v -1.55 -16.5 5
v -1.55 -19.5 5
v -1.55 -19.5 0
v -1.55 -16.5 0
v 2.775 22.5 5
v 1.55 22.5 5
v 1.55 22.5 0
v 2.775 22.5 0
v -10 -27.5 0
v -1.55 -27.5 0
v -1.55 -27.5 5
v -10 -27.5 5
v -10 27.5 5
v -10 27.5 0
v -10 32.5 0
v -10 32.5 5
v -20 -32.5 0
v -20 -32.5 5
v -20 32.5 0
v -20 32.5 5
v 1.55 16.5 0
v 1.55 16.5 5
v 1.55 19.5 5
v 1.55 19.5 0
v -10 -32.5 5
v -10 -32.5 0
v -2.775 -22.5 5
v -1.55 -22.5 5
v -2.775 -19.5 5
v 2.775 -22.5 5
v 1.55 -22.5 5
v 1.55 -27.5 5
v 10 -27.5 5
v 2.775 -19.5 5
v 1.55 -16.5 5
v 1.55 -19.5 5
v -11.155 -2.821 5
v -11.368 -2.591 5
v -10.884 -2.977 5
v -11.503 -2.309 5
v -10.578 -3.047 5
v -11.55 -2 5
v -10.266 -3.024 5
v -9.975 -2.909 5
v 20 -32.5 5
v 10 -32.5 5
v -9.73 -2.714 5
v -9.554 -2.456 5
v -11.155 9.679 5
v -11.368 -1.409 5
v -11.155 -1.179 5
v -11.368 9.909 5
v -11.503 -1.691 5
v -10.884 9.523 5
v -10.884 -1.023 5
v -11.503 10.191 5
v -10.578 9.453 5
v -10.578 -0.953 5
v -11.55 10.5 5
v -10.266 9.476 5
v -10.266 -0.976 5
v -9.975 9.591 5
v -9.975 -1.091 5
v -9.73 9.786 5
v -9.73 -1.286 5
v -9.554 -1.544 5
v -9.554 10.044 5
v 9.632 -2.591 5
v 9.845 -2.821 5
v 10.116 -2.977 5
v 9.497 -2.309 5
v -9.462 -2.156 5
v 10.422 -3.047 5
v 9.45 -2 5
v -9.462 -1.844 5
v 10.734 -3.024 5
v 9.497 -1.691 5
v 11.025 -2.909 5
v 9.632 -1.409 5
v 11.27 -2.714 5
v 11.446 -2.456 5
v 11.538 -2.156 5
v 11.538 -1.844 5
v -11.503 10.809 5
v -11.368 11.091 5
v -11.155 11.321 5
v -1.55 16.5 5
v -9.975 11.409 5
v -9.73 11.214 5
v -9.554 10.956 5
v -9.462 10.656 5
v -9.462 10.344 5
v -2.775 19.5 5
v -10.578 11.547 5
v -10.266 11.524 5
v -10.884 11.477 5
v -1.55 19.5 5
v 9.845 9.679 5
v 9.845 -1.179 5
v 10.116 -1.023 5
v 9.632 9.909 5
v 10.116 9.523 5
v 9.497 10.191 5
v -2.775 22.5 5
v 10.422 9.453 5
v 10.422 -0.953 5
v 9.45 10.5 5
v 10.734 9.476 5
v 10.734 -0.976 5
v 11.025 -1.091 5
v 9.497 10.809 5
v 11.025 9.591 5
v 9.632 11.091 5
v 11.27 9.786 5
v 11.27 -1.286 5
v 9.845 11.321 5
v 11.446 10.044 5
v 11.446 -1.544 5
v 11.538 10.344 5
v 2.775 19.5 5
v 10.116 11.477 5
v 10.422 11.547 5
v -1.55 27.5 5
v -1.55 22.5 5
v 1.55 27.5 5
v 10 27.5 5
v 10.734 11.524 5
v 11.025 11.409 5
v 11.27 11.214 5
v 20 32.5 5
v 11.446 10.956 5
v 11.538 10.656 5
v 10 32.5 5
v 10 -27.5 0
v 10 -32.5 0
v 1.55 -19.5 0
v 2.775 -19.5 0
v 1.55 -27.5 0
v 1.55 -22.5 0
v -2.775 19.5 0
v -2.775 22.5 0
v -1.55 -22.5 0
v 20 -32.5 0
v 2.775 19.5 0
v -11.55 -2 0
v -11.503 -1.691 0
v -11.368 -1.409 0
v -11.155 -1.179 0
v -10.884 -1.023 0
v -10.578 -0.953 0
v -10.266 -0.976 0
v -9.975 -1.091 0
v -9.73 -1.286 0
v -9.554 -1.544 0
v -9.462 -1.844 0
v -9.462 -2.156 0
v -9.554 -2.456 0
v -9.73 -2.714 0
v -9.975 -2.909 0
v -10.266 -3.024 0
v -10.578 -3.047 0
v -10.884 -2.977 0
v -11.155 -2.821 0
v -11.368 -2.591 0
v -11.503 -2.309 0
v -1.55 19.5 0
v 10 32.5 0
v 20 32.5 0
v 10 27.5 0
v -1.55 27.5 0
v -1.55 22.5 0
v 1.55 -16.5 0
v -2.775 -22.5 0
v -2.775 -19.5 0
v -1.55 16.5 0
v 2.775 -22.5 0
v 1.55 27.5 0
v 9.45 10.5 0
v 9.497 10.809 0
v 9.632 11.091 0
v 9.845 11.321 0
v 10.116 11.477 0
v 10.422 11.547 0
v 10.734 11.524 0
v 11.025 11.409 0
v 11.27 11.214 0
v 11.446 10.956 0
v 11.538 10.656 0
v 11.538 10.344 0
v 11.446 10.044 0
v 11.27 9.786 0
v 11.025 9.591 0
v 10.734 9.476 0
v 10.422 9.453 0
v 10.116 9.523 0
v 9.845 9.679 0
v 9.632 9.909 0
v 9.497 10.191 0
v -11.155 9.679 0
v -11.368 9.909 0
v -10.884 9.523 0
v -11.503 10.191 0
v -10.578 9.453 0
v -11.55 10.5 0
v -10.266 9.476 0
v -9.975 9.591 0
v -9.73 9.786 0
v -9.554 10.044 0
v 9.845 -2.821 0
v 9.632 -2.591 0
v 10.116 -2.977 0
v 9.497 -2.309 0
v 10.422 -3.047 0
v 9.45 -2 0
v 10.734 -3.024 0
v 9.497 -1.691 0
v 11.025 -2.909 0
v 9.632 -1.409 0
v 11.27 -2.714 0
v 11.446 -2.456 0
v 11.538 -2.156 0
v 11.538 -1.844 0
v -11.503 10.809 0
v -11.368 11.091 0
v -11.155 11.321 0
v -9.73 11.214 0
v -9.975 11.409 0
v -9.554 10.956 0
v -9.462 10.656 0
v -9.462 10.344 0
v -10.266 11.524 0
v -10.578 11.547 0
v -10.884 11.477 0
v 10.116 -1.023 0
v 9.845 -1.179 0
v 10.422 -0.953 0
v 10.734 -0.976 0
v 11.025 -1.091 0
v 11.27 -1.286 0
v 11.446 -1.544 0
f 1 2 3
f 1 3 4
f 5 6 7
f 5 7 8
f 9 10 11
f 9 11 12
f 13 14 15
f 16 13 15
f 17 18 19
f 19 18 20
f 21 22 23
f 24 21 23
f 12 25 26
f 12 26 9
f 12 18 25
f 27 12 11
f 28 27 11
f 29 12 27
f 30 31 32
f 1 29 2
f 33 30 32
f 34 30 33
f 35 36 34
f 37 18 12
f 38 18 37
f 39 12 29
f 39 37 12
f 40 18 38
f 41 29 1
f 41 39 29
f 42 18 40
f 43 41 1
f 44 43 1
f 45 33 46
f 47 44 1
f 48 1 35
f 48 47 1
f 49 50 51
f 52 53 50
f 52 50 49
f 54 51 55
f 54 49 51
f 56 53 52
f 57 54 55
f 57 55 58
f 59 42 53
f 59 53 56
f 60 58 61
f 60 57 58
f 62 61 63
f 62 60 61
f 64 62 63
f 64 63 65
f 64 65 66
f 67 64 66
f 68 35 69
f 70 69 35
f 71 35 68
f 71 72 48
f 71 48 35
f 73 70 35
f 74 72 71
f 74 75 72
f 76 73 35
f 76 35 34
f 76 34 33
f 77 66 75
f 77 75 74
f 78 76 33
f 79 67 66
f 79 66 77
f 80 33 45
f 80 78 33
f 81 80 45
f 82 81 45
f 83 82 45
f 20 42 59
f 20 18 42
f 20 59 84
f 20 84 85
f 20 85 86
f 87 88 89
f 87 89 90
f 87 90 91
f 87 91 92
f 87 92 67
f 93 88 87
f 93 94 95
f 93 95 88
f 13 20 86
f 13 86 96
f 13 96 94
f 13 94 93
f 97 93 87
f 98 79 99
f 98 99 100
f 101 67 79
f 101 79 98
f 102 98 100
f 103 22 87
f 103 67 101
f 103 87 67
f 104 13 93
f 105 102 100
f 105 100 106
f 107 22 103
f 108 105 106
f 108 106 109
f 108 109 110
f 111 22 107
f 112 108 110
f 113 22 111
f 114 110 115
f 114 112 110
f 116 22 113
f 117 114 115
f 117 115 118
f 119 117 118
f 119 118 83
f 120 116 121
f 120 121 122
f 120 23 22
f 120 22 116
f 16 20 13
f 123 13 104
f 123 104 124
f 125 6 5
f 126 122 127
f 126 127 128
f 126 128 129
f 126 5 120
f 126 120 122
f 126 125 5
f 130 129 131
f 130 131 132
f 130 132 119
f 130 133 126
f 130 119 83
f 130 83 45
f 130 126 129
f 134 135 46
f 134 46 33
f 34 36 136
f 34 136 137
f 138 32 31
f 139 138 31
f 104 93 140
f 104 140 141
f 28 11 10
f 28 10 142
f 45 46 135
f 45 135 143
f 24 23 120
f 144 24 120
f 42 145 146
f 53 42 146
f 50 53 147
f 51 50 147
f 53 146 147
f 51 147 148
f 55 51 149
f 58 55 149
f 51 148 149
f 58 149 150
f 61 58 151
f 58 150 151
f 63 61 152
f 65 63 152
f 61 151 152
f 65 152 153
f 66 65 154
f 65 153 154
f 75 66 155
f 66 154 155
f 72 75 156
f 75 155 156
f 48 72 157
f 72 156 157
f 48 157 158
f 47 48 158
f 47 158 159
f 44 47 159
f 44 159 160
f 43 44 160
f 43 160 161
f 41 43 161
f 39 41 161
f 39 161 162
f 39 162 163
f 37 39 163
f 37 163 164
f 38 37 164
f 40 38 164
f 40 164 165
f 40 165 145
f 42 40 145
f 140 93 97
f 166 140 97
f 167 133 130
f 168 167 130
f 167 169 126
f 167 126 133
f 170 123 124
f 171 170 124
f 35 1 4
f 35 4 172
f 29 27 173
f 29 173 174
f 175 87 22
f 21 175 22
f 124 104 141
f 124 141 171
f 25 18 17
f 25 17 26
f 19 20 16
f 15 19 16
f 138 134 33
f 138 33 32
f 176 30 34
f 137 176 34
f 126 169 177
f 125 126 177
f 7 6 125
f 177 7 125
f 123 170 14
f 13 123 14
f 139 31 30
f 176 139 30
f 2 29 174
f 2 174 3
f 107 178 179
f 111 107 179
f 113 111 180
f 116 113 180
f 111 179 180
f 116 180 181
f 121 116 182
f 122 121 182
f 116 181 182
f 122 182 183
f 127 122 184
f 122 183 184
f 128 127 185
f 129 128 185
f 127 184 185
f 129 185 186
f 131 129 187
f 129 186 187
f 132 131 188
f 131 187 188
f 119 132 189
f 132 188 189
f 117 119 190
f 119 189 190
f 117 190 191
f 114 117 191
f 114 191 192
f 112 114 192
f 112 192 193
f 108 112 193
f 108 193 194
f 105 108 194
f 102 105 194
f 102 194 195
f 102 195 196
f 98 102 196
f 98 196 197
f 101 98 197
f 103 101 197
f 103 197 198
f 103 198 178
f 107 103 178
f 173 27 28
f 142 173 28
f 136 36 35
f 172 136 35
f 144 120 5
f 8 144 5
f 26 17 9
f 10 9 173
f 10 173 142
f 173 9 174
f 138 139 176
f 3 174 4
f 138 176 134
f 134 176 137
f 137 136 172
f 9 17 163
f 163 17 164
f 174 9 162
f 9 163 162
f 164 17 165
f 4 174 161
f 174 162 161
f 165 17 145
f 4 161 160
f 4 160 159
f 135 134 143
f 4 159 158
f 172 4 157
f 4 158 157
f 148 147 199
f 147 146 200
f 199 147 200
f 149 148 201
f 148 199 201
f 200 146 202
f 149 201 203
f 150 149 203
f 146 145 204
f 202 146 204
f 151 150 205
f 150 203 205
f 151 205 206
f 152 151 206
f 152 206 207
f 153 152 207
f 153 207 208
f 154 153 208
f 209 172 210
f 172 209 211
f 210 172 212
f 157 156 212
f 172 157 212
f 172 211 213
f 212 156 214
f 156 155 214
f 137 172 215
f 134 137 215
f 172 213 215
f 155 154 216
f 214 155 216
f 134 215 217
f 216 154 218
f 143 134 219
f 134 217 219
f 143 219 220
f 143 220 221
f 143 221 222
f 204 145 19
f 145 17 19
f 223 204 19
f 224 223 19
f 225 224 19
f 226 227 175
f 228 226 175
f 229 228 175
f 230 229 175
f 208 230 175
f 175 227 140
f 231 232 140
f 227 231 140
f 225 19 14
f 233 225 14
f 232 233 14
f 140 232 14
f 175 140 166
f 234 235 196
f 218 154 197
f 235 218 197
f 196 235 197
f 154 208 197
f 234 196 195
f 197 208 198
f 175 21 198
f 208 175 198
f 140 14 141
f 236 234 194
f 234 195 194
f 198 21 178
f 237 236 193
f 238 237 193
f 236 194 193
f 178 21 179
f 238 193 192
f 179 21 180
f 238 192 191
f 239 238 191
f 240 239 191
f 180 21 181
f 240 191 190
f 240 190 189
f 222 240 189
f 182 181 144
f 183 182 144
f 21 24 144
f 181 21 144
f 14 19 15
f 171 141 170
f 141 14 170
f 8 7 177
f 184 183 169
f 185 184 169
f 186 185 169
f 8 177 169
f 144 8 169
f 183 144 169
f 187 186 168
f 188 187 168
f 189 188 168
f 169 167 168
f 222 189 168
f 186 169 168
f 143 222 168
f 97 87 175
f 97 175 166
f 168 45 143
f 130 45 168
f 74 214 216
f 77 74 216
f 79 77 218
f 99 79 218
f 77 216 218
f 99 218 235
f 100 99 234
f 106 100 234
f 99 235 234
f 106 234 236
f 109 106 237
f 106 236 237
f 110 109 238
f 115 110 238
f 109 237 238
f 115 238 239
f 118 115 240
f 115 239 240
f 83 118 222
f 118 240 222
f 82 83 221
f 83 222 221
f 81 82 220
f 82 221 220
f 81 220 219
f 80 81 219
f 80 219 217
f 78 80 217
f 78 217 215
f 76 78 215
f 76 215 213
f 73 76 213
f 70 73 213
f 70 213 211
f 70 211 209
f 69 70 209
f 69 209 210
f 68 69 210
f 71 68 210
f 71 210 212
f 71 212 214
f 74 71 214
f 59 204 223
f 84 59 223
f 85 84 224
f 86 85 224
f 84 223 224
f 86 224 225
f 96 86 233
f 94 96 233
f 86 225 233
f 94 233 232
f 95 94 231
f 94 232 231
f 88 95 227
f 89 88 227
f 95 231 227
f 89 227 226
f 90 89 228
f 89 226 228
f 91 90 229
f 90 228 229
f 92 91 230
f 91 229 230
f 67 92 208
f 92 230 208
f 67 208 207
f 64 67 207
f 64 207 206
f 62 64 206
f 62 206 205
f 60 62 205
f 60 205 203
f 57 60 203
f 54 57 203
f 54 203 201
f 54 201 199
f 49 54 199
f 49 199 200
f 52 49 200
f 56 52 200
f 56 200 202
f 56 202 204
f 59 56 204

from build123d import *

# Parameters (mm, degrees)
ESQUISSE1_W             = 40
ESQUISSE1_H             = 62
BOSS_EXTRU_1_DEPTH      = 5
ESQUISSE2_W             = 20
ESQUISSE2_H             = 3.5
ENL_V_MAT_EXTRU_1_DEPTH = 6
ESQUISSE3_W             = 20
ESQUISSE3_H             = 3.5
ENL_V_MAT_EXTRU_2_DEPTH = 6
ESQUISSE8_W             = 3.1
ESQUISSE8_H             = 3
ESQUISSE8_H_2           = 5
ESQUISSE8_W_2           = 1.225
ENL_V_MAT_EXTRU_3_DEPTH = 6
ESQUISSE9_W             = 10
ESQUISSE9_H             = 65
BOSS_EXTRU_2_DEPTH      = 5
ESQUISSE10_R            = 1.05
ENL_V_MAT_EXTRU_4_DEPTH = 6


with BuildPart() as part:
    # Esquisse1 → Boss.-Extru.1 (new body)
    with BuildSketch(Plane.XY.offset(5)):
        Rectangle(ESQUISSE1_W, ESQUISSE1_H)
    extrude(amount=-BOSS_EXTRU_1_DEPTH)

    # Esquisse2 → Enlèv. mat.-Extru.1 (cut, through all)
    with BuildSketch(Plane(origin=(0, 0, 0), x_dir=(-1, 0, 0), z_dir=(0, 0, -1))):
        with Locations((0, 29.25)):
            Rectangle(ESQUISSE2_W, ESQUISSE2_H)
    extrude(amount=-ENL_V_MAT_EXTRU_1_DEPTH, mode=Mode.SUBTRACT)

    # Esquisse3 → Enlèv. mat.-Extru.2 (cut, through all)
    with BuildSketch(Plane(origin=(0, 0, 0), x_dir=(-1, 0, 0), z_dir=(0, 0, -1))):
        with Locations((0, -29.25)):
            Rectangle(ESQUISSE3_W, ESQUISSE3_H)
    extrude(amount=-ENL_V_MAT_EXTRU_2_DEPTH, mode=Mode.SUBTRACT)

    # Esquisse8 → Enlèv. mat.-Extru.3 (cut, through all)
    with BuildSketch(Plane.XY.offset(5)):
        with Locations((0, 21)):
            Rectangle(ESQUISSE8_W, ESQUISSE8_H)
        with Locations((0, 25)):
            Rectangle(ESQUISSE8_W, ESQUISSE8_H_2)
        with Locations((-2.1625, 21)):
            Rectangle(ESQUISSE8_W_2, ESQUISSE8_H)
        with Locations((2.1625, 21)):
            Rectangle(ESQUISSE8_W_2, ESQUISSE8_H)
        with Locations((0, 18)):
            Rectangle(ESQUISSE8_W, ESQUISSE8_H)
        with Locations((0, -18)):
            Rectangle(ESQUISSE8_W, ESQUISSE8_H)
        with Locations((-2.1625, -21)):
            Rectangle(ESQUISSE8_W_2, ESQUISSE8_H)
        with Locations((0, -21)):
            Rectangle(ESQUISSE8_W, ESQUISSE8_H)
        with Locations((2.1625, -21)):
            Rectangle(ESQUISSE8_W_2, ESQUISSE8_H)
        with Locations((0, -25)):
            Rectangle(ESQUISSE8_W, ESQUISSE8_H_2)
    extrude(amount=-ENL_V_MAT_EXTRU_3_DEPTH, mode=Mode.SUBTRACT)

    # Esquisse9 → Boss.-Extru.2 (add)
    with BuildSketch(Plane.XY.offset(5)):
        with Locations((-15, 0)):
            Rectangle(ESQUISSE9_W, ESQUISSE9_H)
        with Locations((15, 0)):
            Rectangle(ESQUISSE9_W, ESQUISSE9_H)
    extrude(amount=-BOSS_EXTRU_2_DEPTH)

    # Esquisse10 → Enlèv. mat.-Extru.4 (cut, through all)
    with BuildSketch(Plane(origin=(0, 0, 0), x_dir=(-1, 0, 0), z_dir=(0, 0, -1))):
        with Locations((-10.5, 10.5)):
            Circle(ESQUISSE10_R)
        with Locations((10.5, 10.5)):
            Circle(ESQUISSE10_R)
        with Locations((10.5, -2)):
            Circle(ESQUISSE10_R)
        with Locations((-10.5, -2)):
            Circle(ESQUISSE10_R)
    extrude(amount=-ENL_V_MAT_EXTRU_4_DEPTH, mode=Mode.SUBTRACT)


solid = part.part
